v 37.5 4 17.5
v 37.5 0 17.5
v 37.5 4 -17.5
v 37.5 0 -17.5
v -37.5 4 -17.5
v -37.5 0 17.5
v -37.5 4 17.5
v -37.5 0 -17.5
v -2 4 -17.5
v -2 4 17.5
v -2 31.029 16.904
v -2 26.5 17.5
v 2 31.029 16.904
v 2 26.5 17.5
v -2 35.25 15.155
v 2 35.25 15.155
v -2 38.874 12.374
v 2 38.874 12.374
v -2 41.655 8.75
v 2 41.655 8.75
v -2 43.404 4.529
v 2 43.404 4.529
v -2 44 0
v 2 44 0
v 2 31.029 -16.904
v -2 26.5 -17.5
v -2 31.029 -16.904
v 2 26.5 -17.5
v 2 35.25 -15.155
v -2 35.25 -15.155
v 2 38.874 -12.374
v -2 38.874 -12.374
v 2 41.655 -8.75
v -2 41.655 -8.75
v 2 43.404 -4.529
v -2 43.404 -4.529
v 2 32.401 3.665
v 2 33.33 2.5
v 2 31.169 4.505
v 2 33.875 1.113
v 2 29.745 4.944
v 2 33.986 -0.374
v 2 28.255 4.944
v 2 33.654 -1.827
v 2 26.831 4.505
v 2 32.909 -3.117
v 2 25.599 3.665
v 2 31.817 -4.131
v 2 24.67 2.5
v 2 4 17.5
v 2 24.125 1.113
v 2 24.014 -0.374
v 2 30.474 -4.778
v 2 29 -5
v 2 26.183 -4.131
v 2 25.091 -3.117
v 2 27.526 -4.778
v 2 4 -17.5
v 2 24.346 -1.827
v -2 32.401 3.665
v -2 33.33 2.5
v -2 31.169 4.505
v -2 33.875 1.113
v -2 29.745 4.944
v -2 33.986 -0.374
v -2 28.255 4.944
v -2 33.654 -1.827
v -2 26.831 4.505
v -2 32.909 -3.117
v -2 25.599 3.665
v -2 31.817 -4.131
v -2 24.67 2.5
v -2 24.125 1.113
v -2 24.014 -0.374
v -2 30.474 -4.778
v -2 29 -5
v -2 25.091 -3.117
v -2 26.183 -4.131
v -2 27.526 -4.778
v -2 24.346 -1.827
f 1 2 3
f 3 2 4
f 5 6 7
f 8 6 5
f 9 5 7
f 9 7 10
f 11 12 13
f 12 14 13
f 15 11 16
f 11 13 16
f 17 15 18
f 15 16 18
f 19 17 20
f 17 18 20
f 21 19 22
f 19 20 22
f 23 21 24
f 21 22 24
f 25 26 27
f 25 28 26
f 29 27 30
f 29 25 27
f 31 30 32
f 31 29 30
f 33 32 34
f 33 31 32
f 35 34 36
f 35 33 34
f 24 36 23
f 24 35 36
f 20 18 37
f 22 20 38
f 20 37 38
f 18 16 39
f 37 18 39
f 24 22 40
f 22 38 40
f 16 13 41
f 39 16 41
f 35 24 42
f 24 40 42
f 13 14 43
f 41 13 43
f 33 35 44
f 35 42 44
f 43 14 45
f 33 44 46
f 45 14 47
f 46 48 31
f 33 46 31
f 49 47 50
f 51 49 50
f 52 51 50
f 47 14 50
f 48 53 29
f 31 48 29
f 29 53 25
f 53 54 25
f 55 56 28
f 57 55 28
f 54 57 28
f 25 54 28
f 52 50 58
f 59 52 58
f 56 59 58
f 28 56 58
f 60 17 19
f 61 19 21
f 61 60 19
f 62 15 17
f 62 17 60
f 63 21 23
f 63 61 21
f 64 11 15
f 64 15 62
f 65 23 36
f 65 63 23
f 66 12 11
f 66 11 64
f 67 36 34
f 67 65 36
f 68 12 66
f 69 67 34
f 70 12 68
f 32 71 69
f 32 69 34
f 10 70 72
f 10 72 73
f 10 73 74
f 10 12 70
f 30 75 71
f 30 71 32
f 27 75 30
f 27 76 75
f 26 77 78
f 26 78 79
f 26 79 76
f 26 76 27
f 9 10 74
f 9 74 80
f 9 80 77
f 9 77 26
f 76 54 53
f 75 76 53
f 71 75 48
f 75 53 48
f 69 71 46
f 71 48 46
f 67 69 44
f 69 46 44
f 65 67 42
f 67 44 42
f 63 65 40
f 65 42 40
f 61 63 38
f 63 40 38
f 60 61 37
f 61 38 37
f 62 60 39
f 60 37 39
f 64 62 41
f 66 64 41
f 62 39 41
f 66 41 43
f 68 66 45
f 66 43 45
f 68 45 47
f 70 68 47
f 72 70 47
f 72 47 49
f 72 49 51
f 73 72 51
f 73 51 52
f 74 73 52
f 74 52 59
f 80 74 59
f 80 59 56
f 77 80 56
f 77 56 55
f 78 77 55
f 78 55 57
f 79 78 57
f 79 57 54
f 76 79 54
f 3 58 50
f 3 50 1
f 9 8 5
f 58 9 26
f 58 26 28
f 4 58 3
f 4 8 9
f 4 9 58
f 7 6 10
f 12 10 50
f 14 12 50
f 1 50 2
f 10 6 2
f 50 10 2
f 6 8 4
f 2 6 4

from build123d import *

# Parameters (mm, degrees)
SKETCH1_W           = 75
SKETCH1_H           = 35
BOSS_EXTRUDE1_DEPTH = 4
SKETCH2_W           = 4
SKETCH2_H           = 35
BOSS_EXTRUDE2_DEPTH = 40
SKETCH3_R           = 5
CUT_EXTRUDE1_DEPTH  = 62.664414373
FILLET1_R           = 17.5


with BuildPart() as part:
    # Sketch1 → Boss-Extrude1 (new body)
    with BuildSketch(Plane(origin=(0, 0, 0), x_dir=(1, 0, 0), z_dir=(0, 1, 0))):
        Rectangle(SKETCH1_W, SKETCH1_H)
    extrude(amount=BOSS_EXTRUDE1_DEPTH)

    # Sketch2 → Boss-Extrude2 (add)
    with BuildSketch(Plane(origin=(0, 4, 0), x_dir=(1, 0, 0), z_dir=(0, 1, 0))):
        Rectangle(SKETCH2_W, SKETCH2_H)
    extrude(amount=BOSS_EXTRUDE2_DEPTH)

    # Sketch3 → Cut-Extrude1 (cut, through all)
    with BuildSketch(Plane(origin=(2, 0, 0), x_dir=(0, 0, -1), z_dir=(1, 0, 0))):
        with Locations((0, 29)):
            Circle(SKETCH3_R)
    extrude(amount=-CUT_EXTRUDE1_DEPTH, mode=Mode.SUBTRACT)

    # Fillet1
    fillet1_edges = [part.edges().sort_by_distance(p)[0] for p in [
        (0, 44, -17.5),
        (0, 44, 17.5),
    ]]
    fillet(fillet1_edges, radius=FILLET1_R - 0.0001)  # a hair under: the kernel refuses the full size


solid = part.part
